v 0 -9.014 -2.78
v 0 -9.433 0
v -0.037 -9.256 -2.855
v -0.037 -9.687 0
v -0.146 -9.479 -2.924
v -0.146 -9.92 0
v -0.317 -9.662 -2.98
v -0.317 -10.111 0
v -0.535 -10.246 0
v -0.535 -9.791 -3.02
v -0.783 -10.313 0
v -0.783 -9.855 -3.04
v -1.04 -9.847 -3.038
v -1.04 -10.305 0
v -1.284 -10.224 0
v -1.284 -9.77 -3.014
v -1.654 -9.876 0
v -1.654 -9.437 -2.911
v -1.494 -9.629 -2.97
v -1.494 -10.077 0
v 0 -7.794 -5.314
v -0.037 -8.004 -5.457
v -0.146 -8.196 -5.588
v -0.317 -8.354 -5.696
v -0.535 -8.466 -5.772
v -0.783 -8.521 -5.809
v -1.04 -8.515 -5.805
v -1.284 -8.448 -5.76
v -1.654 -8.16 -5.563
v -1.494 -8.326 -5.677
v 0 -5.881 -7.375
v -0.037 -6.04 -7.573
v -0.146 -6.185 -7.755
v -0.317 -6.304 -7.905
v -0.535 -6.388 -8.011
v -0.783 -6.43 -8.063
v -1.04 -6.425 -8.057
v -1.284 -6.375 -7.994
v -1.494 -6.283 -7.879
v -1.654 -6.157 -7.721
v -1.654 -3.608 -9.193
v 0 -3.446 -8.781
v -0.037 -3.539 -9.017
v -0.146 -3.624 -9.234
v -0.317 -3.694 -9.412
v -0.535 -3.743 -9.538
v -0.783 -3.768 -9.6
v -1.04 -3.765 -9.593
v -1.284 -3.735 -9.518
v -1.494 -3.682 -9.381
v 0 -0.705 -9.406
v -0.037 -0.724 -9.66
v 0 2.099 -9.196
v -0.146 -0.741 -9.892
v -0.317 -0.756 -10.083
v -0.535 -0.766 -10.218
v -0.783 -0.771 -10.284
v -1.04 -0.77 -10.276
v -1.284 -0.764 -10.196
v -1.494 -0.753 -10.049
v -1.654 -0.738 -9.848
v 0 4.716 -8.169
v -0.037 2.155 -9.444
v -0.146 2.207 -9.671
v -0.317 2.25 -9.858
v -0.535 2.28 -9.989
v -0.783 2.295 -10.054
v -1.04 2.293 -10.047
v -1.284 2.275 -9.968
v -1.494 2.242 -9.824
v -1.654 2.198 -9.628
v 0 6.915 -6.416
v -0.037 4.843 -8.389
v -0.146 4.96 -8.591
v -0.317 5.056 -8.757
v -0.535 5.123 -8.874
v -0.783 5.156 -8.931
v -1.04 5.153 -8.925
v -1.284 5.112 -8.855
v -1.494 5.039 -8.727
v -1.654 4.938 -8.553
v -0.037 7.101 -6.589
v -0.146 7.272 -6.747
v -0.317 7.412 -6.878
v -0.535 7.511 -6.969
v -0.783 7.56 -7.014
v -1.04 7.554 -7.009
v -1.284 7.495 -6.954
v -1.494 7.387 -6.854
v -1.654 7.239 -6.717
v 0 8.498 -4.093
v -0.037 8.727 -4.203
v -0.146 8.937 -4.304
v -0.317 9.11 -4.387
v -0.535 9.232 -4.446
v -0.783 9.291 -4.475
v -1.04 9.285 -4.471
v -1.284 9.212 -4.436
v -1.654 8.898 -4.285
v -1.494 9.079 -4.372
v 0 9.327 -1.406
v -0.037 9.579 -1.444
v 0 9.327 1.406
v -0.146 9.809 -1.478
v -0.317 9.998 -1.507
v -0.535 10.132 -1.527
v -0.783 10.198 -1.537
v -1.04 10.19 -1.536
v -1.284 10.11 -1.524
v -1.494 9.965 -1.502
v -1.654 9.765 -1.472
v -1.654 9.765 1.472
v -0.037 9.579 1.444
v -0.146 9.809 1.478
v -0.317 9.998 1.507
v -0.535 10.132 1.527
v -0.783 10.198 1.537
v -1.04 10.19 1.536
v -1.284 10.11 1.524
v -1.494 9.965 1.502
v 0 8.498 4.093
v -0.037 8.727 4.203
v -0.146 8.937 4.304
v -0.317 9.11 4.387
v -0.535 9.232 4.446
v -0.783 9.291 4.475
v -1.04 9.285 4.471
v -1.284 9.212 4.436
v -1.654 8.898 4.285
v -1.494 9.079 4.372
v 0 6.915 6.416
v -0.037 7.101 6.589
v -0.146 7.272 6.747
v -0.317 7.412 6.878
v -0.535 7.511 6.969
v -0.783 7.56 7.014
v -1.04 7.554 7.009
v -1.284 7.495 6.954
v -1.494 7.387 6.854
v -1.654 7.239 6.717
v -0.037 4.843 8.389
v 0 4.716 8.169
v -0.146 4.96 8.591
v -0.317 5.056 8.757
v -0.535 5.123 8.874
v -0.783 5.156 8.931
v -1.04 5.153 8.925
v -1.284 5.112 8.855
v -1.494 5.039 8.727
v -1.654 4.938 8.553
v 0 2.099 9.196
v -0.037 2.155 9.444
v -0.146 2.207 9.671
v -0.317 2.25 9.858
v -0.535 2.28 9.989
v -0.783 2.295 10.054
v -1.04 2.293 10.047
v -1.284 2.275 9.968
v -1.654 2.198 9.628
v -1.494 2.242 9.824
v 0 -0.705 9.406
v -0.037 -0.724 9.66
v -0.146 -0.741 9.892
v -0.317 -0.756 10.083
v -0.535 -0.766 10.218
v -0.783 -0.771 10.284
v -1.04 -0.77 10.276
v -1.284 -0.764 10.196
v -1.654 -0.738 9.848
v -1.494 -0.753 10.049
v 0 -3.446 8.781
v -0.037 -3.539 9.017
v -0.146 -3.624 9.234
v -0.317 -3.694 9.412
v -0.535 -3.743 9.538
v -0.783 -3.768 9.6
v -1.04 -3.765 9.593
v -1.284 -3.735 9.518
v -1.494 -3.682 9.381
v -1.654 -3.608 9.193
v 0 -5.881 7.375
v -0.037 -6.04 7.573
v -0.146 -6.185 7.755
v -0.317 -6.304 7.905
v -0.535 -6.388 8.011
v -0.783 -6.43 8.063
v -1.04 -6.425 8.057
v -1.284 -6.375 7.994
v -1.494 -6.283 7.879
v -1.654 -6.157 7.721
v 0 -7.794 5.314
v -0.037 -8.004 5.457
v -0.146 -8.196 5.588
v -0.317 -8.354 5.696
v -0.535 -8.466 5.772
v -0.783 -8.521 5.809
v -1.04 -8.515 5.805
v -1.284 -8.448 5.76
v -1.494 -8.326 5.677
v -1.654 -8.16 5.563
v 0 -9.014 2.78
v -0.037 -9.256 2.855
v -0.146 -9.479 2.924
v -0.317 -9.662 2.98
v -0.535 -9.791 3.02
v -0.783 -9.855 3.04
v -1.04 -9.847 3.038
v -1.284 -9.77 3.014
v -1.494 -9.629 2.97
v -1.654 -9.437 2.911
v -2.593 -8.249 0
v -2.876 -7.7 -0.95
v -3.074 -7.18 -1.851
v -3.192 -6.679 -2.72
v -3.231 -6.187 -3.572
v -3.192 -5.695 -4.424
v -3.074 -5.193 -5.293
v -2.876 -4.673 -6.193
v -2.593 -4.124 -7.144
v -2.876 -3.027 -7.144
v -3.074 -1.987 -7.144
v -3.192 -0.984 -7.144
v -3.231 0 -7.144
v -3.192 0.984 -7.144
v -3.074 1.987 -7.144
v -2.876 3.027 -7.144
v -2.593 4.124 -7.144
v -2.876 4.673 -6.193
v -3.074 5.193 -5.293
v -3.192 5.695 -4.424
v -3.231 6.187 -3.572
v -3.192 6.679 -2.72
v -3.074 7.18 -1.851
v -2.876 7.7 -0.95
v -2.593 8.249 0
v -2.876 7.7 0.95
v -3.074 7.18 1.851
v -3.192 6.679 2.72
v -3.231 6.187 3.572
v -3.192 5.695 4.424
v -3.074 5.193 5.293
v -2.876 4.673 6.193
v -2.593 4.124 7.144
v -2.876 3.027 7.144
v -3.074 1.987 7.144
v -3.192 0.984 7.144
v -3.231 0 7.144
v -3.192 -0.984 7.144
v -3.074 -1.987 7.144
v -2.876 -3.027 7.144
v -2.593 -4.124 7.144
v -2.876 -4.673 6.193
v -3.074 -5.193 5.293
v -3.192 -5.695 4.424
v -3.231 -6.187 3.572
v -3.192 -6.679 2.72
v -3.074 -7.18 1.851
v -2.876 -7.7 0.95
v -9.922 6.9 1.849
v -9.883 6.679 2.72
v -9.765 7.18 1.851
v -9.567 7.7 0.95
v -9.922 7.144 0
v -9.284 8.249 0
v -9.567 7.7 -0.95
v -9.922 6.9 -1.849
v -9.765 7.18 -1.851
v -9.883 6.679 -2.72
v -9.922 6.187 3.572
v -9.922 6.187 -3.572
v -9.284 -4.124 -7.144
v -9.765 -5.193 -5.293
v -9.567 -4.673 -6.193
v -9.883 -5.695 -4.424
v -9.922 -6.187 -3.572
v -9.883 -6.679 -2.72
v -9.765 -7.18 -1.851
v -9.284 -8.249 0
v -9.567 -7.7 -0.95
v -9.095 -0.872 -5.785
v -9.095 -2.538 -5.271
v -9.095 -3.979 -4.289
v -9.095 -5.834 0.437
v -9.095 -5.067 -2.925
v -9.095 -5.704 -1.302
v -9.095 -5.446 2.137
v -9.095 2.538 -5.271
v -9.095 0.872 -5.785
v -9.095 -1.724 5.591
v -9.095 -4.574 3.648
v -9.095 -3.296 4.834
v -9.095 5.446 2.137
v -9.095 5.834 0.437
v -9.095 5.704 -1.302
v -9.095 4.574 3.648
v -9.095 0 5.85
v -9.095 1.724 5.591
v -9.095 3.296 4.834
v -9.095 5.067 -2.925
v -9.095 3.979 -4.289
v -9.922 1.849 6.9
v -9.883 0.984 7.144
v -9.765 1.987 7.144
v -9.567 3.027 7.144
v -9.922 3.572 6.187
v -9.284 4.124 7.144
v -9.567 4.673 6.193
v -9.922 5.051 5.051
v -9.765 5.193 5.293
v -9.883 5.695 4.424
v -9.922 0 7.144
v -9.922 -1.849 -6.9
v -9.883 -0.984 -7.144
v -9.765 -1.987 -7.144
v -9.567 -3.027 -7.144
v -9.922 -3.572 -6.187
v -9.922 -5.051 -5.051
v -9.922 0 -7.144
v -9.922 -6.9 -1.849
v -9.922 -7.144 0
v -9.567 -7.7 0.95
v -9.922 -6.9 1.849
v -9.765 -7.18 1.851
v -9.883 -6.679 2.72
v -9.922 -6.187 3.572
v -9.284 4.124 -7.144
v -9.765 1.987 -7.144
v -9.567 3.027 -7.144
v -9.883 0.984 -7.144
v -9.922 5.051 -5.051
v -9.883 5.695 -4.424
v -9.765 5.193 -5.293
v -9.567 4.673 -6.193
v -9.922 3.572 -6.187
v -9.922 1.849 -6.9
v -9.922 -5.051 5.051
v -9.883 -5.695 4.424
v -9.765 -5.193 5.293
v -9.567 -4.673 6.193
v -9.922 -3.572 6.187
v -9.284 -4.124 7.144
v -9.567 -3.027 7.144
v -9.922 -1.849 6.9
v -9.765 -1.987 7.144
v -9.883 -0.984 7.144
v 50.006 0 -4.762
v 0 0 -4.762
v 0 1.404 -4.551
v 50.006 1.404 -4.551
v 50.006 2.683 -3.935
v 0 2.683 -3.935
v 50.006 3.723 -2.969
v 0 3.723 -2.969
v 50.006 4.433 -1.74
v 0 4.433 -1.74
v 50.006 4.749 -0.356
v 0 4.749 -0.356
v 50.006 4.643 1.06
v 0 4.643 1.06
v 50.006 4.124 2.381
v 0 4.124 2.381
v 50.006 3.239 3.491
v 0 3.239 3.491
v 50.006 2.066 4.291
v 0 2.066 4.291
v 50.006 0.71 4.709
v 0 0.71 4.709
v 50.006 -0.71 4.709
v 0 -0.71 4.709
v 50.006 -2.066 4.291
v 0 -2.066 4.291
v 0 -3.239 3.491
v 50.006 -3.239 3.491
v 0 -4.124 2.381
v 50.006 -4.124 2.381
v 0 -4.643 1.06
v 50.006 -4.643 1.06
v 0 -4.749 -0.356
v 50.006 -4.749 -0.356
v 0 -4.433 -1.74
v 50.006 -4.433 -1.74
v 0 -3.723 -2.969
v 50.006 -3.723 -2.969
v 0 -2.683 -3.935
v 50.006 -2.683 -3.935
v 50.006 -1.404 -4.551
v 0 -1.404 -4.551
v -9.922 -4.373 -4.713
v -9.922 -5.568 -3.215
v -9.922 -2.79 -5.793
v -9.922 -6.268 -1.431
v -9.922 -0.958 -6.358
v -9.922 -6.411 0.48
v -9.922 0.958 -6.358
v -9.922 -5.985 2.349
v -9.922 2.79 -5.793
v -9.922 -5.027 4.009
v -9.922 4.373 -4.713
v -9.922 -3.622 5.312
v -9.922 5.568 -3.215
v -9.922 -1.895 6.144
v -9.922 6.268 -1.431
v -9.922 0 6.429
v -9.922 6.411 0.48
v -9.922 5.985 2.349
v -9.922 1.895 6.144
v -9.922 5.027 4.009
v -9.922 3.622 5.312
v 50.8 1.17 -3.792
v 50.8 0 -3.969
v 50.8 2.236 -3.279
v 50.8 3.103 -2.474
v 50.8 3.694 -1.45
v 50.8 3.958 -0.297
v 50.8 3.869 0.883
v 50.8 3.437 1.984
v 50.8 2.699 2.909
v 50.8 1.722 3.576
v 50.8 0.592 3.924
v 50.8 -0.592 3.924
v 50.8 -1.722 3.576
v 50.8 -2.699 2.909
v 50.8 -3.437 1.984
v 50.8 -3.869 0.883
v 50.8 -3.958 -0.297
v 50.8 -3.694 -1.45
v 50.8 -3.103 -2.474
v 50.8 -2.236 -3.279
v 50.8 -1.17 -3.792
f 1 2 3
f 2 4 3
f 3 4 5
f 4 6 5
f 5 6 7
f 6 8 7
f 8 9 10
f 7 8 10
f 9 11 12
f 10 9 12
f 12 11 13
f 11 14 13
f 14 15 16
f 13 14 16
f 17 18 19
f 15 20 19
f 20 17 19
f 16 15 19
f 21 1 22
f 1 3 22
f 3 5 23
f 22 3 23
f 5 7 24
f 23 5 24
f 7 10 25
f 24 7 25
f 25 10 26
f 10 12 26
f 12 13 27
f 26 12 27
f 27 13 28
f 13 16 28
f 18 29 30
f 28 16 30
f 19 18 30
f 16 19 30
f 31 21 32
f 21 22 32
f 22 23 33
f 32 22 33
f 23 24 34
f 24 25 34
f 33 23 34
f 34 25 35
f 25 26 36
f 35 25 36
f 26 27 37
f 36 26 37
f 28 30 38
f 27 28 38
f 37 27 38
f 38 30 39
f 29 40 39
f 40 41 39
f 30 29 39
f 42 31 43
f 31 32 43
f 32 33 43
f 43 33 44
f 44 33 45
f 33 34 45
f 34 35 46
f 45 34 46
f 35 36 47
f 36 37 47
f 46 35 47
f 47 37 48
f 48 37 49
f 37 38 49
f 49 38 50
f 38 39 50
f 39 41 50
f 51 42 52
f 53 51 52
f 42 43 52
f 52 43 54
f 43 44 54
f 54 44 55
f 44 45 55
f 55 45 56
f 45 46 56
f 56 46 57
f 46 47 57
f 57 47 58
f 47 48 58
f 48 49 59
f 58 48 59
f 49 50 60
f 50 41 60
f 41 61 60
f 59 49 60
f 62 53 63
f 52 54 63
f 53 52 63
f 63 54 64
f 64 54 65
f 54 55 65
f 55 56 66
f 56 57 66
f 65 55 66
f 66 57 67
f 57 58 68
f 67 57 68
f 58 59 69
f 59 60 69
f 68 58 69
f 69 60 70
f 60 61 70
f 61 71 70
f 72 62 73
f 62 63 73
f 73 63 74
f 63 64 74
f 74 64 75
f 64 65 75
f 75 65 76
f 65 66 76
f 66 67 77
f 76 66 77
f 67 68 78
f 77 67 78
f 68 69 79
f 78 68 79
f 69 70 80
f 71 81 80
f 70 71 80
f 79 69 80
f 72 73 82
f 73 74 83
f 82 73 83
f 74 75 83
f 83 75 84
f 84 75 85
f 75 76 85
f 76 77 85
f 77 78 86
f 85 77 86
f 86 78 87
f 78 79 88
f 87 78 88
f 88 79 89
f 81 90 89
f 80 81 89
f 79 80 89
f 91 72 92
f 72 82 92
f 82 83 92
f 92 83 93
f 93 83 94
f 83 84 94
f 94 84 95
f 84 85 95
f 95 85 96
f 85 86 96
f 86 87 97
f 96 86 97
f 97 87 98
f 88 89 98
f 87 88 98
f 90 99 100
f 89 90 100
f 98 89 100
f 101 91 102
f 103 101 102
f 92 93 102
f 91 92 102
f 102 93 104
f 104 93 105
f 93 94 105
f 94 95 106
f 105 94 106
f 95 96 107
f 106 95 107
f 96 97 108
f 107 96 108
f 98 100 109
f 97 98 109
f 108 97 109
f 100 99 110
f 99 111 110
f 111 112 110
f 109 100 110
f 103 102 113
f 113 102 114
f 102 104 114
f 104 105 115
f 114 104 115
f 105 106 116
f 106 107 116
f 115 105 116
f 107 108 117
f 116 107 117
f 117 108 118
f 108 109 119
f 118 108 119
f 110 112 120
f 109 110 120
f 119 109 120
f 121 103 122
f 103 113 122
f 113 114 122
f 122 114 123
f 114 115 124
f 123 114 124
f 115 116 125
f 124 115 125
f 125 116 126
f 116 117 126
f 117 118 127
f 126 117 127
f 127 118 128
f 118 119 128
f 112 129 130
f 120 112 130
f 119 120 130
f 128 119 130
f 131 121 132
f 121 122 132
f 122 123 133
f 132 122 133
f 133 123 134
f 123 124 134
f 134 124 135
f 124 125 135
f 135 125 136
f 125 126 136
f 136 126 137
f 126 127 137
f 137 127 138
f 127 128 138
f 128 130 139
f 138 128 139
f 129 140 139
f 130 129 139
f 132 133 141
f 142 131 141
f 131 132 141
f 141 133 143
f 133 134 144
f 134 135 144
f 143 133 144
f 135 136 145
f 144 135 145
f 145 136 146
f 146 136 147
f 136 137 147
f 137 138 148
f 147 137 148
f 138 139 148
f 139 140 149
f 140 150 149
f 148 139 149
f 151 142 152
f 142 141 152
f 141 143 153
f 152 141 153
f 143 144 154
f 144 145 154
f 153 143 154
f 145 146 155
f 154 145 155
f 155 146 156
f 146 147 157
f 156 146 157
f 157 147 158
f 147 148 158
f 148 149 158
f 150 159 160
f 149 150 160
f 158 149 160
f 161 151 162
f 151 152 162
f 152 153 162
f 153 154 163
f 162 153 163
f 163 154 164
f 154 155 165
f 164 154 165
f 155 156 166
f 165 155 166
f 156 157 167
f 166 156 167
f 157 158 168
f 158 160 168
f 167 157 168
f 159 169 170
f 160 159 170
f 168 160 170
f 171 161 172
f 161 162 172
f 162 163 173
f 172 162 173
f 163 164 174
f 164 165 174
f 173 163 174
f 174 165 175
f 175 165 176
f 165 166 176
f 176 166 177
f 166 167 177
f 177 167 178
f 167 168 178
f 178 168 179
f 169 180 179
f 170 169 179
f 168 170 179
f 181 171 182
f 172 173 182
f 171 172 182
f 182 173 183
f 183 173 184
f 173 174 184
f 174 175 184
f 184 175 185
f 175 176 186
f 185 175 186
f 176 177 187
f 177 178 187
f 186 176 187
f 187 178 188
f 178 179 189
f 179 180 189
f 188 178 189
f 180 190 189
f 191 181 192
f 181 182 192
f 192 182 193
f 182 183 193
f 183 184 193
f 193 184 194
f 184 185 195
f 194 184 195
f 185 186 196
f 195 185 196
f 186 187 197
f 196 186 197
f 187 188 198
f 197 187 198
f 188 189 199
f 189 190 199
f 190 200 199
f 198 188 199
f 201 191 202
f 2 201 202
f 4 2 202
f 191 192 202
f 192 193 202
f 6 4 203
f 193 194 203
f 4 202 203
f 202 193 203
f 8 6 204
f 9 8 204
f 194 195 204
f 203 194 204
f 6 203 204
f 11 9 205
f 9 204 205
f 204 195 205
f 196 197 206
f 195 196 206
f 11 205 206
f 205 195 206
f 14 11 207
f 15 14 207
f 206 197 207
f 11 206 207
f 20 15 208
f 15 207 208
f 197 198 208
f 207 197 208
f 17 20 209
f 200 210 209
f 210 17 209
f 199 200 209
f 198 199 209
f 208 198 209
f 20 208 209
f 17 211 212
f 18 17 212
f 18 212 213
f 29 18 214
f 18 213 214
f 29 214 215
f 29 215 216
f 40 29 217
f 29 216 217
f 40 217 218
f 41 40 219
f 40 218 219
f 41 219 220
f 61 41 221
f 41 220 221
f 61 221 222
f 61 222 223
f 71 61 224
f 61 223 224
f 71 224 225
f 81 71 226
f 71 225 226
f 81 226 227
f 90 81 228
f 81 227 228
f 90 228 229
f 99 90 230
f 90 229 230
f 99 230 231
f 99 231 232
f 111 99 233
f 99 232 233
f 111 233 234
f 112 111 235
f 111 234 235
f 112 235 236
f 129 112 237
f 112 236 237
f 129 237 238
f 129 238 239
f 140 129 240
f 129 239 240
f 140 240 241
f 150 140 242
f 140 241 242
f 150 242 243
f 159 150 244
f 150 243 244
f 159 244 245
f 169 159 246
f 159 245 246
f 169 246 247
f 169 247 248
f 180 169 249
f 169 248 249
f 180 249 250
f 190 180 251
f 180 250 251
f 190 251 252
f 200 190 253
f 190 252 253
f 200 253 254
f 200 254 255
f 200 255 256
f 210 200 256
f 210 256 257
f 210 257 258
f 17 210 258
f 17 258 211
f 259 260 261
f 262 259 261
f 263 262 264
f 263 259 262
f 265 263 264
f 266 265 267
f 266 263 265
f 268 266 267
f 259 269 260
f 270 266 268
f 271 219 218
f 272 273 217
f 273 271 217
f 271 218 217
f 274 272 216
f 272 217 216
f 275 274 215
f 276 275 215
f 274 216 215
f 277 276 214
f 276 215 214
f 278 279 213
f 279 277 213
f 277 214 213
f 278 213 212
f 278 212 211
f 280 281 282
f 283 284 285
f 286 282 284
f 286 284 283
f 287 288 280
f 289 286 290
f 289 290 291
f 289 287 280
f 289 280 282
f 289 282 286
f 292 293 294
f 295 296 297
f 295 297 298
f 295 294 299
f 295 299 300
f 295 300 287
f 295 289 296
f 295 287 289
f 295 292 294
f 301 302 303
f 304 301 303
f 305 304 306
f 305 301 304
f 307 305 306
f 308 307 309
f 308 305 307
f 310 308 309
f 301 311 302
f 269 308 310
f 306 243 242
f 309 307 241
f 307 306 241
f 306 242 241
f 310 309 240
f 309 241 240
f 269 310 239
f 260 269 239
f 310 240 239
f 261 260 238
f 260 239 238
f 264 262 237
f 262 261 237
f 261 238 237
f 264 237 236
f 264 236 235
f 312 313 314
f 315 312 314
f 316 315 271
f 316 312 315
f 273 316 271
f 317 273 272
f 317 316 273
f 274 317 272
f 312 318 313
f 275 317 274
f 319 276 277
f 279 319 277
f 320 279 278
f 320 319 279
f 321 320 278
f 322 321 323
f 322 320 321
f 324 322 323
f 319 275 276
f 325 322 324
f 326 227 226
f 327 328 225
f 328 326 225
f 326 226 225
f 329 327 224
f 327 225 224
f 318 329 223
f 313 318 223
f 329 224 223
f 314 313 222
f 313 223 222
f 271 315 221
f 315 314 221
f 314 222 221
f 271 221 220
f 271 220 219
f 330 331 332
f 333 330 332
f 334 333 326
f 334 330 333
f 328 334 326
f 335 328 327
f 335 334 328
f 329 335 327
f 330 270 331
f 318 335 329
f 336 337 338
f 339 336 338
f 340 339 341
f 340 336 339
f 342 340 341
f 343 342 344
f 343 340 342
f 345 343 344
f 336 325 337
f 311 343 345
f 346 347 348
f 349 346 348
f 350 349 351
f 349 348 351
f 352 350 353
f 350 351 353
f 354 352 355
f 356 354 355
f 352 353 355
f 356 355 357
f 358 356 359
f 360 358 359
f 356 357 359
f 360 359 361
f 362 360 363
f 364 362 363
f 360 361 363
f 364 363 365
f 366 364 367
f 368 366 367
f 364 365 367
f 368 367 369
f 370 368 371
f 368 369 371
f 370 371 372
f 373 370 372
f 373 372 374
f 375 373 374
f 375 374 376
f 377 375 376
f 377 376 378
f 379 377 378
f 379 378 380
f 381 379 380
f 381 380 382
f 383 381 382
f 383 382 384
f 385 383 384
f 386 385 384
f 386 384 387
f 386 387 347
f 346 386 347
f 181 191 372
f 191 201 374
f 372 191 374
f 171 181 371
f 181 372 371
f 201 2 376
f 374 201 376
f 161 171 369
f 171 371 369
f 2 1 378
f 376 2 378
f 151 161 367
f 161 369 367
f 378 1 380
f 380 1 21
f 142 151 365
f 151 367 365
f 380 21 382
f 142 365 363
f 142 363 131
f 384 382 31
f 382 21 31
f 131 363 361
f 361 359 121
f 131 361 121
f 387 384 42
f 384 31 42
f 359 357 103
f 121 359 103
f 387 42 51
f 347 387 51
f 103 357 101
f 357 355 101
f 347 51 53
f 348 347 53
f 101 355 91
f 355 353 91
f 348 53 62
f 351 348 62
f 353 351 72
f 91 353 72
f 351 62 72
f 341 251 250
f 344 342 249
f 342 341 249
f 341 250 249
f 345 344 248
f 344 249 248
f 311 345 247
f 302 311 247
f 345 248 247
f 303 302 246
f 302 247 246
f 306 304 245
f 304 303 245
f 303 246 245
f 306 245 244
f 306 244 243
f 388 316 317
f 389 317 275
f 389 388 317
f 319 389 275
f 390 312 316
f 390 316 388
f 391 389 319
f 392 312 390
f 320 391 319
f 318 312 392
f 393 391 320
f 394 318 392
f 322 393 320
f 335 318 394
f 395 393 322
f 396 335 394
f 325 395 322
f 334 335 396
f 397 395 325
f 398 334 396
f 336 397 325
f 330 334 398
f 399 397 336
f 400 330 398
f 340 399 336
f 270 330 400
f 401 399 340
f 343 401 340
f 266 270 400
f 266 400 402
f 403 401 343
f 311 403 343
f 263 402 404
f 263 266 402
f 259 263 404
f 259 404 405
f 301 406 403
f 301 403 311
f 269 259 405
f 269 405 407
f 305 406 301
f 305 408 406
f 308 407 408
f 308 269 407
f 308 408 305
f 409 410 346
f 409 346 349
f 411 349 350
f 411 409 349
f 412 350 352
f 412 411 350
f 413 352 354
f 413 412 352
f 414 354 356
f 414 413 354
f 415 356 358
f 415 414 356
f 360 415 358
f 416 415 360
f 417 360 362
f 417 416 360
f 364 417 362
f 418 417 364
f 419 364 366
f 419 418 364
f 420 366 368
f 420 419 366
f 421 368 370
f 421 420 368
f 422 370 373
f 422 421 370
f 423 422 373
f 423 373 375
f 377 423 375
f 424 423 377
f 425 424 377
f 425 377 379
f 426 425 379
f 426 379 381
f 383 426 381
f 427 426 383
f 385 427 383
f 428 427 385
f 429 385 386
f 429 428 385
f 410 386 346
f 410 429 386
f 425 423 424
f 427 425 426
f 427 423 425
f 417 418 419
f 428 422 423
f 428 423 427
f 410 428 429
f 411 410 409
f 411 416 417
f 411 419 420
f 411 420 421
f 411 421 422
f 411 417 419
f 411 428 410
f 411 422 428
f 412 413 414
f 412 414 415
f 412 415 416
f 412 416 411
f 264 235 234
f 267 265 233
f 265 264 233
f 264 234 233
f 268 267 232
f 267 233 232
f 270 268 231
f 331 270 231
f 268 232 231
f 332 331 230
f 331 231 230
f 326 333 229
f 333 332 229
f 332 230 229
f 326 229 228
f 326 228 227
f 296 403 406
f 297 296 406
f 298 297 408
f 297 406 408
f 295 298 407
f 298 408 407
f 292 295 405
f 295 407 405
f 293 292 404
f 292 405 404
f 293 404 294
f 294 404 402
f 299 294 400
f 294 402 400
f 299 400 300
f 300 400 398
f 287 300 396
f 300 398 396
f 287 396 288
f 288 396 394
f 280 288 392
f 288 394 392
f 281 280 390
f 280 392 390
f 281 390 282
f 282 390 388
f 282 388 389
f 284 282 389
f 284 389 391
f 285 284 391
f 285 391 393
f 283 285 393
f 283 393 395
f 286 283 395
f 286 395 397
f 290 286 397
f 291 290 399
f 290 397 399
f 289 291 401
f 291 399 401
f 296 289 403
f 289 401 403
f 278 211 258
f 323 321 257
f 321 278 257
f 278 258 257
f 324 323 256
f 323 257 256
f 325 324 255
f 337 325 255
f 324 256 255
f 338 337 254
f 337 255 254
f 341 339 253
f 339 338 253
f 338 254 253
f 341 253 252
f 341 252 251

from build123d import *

# Parameters (mm, degrees)
SKETCH2_R           = 4.7625
BOSS_EXTRUDE1_DEPTH = 50.8
CHAMFER1_SIZE       = 0.793750063
BOSS_EXTRUDE2_DEPTH = 9.921875
SKETCH5_OUTSIDE_W   = 70.482
SKETCH5_OUTSIDE_H   = 70.482
SKETCH5_OUTSIDE_R   = 7.14375
CUT_EXTRUDE1_DEPTH  = 9.921875
CUT_EXTRUDE1_DRAFT  = -60
SKETCH6_R           = 6.429375
CUT_EXTRUDE2_DEPTH  = 0.826822917
CUT_EXTRUDE2_DRAFT  = -35
SKETCH14_W          = 25.4
SKETCH14_H          = 4.7625


with BuildPart() as part:
    # Sketch2 → Boss-Extrude1 (new body)
    with BuildSketch(Plane(origin=(0, 0, 0), x_dir=(0, 0, -1), z_dir=(1, 0, 0))):
        Circle(SKETCH2_R)
    extrude(amount=BOSS_EXTRUDE1_DEPTH)

    # Chamfer1
    chamfer1_edges = [part.edges().sort_by_distance(p)[0] for p in [
        (50.8, 0, 4.7625),
    ]]
    chamfer(chamfer1_edges, length=CHAMFER1_SIZE)

    # Sketch3 → Boss-Extrude2 (add)
    with BuildSketch(Plane.ZY):
        Polygon((0, 8.248891971), (-7.14375, 4.124445986), (-7.14375, -4.124445986), (0, -8.248891971), (7.14375, -4.124445986), (7.14375, 4.124445986), align=None)
    extrude(amount=BOSS_EXTRUDE2_DEPTH)

    # Sketch4 → Revolve1 (revolve)
    with BuildSketch(Plane.XY, mode=Mode.PRIVATE) as revolve1_sk:
        with BuildLine():
            Line((0, 0), (0, 9.432563869))
            ThreePointArc((0, 9.432563869), (-0.656824283, 10.28855394), (-1.653645833, 9.875656934))
            Line((-1.653645833, 9.875656934), (-3.230913037, 7.14375))
            Line((-3.230913037, 7.14375), (-3.230913037, 0))
            Line((-3.230913037, 0), (0, 0))
        make_face()
    revolve(revolve1_sk.sketch.rotate(Axis((-3.230913037, 0, 0), (1, 0, 0)), 180), axis=Axis((-3.230913037, 0, 0), (1, 0, 0)))


with BuildPart() as cut_extrude1_tool:
    # Sketch5 outside → Cut-Extrude1 (with draft: the straight prism first)
    with BuildSketch(Plane.ZY.offset(9.921875)):
        Rectangle(SKETCH5_OUTSIDE_W, SKETCH5_OUTSIDE_H)
        Circle(SKETCH5_OUTSIDE_R, mode=Mode.SUBTRACT)
    extrude(amount=-CUT_EXTRUDE1_DEPTH)
    # Cut-Extrude1: the draft: its side faces are tilted about the plane it starts from
    cut_extrude1_sides = [cut_extrude1_tool.faces().sort_by_distance(p)[0] for p in [
        (-4.9609375, -35.241, 0),
        (-4.9609375, 0, 35.241),
        (-4.9609375, 35.241, 0),
        (-4.9609375, 0, -35.241),
        (-4.9609375, 0, -7.14375),
    ]]
    draft(cut_extrude1_sides, Plane.ZY.offset(9.921875), CUT_EXTRUDE1_DRAFT)


with BuildPart() as part_1:
    add(part.part)

    # Cut-Extrude1: cut by cut_extrude1_tool
    add(cut_extrude1_tool.part, mode=Mode.SUBTRACT)


with BuildPart() as cut_extrude2_tool:
    # Sketch6 → Cut-Extrude2 (with draft: the straight prism first)
    with BuildSketch(Plane.ZY.offset(9.921875)):
        Circle(SKETCH6_R)
    extrude(amount=-CUT_EXTRUDE2_DEPTH)
    # Cut-Extrude2: the draft: its side faces are tilted about the plane it starts from
    cut_extrude2_sides = [cut_extrude2_tool.faces().sort_by_distance(p)[0] for p in [
        (-9.508463542, 0, -6.429375),
    ]]
    draft(cut_extrude2_sides, Plane.ZY.offset(9.921875), CUT_EXTRUDE2_DRAFT)


with BuildPart() as part_2:
    add(part_1.part)

    # Cut-Extrude2: cut by cut_extrude2_tool
    add(cut_extrude2_tool.part, mode=Mode.SUBTRACT)

    # Sketch14 → Revolve2 (revolve)
    with BuildSketch(Plane.XY, mode=Mode.PRIVATE) as revolve2_sk:
        with Locations((12.7, 2.38125)):
            Rectangle(SKETCH14_W, SKETCH14_H)
    revolve(revolve2_sk.sketch.rotate(Axis((0, 0, 0), (1, 0, 0)), 90), axis=Axis((0, 0, 0), (1, 0, 0)))


solid = part_2.part
